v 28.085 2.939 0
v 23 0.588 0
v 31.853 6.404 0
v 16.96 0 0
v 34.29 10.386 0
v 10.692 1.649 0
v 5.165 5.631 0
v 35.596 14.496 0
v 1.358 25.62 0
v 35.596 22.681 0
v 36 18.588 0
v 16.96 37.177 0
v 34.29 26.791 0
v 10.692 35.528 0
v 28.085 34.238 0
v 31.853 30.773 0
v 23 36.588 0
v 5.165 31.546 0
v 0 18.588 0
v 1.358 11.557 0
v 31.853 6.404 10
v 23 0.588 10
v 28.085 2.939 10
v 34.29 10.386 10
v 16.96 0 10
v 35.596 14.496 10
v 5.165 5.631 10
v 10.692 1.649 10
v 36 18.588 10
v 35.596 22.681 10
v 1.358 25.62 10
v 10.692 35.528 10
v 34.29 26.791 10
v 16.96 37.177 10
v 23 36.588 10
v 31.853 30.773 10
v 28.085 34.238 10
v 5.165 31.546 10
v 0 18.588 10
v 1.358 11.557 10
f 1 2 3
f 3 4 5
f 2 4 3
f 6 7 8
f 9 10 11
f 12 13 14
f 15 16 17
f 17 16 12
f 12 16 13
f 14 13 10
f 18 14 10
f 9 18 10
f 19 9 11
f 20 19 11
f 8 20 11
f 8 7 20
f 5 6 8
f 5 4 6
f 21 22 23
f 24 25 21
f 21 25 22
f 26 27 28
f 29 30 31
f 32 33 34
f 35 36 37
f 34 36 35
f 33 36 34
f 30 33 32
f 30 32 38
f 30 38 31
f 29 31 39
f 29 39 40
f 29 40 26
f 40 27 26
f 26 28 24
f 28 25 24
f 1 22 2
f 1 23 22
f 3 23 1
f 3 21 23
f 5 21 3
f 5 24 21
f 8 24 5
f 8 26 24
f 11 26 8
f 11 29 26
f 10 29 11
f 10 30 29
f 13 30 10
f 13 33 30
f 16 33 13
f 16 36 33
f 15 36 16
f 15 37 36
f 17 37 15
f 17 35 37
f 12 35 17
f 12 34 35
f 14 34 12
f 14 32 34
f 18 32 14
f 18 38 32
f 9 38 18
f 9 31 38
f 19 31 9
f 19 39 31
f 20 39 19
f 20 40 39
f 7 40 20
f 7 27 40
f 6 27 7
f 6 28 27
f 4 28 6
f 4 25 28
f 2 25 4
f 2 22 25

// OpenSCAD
$fn = 32;

// ----------------------------------------------------------------------
// Cam disc: base radius 13.0 mm, lift 10.0 mm, 20 profile points
// ----------------------------------------------------------------------

// --- parameters (mm) ---
profile_height = 10;      // extrusion height
profile_points = 20;      // points of the closed outline

profile = [[36, 18.588], [35.596, 22.681], [34.29, 26.791], [31.853, 30.773], [28.085, 34.238], [23, 36.588], [16.96, 37.177], [10.692, 35.528], [5.165, 31.546], [1.358, 25.62], [0, 18.588], [1.358, 11.557], [5.165, 5.631], [10.692, 1.649], [16.96, 0], [23, 0.588], [28.085, 2.939], [31.853, 6.404], [34.29, 10.386], [35.596, 14.496]];  // single closed polygon, 20 points, counter clockwise

// --- the one profile operation ---
linear_extrude(height = profile_height) polygon(points = profile);
